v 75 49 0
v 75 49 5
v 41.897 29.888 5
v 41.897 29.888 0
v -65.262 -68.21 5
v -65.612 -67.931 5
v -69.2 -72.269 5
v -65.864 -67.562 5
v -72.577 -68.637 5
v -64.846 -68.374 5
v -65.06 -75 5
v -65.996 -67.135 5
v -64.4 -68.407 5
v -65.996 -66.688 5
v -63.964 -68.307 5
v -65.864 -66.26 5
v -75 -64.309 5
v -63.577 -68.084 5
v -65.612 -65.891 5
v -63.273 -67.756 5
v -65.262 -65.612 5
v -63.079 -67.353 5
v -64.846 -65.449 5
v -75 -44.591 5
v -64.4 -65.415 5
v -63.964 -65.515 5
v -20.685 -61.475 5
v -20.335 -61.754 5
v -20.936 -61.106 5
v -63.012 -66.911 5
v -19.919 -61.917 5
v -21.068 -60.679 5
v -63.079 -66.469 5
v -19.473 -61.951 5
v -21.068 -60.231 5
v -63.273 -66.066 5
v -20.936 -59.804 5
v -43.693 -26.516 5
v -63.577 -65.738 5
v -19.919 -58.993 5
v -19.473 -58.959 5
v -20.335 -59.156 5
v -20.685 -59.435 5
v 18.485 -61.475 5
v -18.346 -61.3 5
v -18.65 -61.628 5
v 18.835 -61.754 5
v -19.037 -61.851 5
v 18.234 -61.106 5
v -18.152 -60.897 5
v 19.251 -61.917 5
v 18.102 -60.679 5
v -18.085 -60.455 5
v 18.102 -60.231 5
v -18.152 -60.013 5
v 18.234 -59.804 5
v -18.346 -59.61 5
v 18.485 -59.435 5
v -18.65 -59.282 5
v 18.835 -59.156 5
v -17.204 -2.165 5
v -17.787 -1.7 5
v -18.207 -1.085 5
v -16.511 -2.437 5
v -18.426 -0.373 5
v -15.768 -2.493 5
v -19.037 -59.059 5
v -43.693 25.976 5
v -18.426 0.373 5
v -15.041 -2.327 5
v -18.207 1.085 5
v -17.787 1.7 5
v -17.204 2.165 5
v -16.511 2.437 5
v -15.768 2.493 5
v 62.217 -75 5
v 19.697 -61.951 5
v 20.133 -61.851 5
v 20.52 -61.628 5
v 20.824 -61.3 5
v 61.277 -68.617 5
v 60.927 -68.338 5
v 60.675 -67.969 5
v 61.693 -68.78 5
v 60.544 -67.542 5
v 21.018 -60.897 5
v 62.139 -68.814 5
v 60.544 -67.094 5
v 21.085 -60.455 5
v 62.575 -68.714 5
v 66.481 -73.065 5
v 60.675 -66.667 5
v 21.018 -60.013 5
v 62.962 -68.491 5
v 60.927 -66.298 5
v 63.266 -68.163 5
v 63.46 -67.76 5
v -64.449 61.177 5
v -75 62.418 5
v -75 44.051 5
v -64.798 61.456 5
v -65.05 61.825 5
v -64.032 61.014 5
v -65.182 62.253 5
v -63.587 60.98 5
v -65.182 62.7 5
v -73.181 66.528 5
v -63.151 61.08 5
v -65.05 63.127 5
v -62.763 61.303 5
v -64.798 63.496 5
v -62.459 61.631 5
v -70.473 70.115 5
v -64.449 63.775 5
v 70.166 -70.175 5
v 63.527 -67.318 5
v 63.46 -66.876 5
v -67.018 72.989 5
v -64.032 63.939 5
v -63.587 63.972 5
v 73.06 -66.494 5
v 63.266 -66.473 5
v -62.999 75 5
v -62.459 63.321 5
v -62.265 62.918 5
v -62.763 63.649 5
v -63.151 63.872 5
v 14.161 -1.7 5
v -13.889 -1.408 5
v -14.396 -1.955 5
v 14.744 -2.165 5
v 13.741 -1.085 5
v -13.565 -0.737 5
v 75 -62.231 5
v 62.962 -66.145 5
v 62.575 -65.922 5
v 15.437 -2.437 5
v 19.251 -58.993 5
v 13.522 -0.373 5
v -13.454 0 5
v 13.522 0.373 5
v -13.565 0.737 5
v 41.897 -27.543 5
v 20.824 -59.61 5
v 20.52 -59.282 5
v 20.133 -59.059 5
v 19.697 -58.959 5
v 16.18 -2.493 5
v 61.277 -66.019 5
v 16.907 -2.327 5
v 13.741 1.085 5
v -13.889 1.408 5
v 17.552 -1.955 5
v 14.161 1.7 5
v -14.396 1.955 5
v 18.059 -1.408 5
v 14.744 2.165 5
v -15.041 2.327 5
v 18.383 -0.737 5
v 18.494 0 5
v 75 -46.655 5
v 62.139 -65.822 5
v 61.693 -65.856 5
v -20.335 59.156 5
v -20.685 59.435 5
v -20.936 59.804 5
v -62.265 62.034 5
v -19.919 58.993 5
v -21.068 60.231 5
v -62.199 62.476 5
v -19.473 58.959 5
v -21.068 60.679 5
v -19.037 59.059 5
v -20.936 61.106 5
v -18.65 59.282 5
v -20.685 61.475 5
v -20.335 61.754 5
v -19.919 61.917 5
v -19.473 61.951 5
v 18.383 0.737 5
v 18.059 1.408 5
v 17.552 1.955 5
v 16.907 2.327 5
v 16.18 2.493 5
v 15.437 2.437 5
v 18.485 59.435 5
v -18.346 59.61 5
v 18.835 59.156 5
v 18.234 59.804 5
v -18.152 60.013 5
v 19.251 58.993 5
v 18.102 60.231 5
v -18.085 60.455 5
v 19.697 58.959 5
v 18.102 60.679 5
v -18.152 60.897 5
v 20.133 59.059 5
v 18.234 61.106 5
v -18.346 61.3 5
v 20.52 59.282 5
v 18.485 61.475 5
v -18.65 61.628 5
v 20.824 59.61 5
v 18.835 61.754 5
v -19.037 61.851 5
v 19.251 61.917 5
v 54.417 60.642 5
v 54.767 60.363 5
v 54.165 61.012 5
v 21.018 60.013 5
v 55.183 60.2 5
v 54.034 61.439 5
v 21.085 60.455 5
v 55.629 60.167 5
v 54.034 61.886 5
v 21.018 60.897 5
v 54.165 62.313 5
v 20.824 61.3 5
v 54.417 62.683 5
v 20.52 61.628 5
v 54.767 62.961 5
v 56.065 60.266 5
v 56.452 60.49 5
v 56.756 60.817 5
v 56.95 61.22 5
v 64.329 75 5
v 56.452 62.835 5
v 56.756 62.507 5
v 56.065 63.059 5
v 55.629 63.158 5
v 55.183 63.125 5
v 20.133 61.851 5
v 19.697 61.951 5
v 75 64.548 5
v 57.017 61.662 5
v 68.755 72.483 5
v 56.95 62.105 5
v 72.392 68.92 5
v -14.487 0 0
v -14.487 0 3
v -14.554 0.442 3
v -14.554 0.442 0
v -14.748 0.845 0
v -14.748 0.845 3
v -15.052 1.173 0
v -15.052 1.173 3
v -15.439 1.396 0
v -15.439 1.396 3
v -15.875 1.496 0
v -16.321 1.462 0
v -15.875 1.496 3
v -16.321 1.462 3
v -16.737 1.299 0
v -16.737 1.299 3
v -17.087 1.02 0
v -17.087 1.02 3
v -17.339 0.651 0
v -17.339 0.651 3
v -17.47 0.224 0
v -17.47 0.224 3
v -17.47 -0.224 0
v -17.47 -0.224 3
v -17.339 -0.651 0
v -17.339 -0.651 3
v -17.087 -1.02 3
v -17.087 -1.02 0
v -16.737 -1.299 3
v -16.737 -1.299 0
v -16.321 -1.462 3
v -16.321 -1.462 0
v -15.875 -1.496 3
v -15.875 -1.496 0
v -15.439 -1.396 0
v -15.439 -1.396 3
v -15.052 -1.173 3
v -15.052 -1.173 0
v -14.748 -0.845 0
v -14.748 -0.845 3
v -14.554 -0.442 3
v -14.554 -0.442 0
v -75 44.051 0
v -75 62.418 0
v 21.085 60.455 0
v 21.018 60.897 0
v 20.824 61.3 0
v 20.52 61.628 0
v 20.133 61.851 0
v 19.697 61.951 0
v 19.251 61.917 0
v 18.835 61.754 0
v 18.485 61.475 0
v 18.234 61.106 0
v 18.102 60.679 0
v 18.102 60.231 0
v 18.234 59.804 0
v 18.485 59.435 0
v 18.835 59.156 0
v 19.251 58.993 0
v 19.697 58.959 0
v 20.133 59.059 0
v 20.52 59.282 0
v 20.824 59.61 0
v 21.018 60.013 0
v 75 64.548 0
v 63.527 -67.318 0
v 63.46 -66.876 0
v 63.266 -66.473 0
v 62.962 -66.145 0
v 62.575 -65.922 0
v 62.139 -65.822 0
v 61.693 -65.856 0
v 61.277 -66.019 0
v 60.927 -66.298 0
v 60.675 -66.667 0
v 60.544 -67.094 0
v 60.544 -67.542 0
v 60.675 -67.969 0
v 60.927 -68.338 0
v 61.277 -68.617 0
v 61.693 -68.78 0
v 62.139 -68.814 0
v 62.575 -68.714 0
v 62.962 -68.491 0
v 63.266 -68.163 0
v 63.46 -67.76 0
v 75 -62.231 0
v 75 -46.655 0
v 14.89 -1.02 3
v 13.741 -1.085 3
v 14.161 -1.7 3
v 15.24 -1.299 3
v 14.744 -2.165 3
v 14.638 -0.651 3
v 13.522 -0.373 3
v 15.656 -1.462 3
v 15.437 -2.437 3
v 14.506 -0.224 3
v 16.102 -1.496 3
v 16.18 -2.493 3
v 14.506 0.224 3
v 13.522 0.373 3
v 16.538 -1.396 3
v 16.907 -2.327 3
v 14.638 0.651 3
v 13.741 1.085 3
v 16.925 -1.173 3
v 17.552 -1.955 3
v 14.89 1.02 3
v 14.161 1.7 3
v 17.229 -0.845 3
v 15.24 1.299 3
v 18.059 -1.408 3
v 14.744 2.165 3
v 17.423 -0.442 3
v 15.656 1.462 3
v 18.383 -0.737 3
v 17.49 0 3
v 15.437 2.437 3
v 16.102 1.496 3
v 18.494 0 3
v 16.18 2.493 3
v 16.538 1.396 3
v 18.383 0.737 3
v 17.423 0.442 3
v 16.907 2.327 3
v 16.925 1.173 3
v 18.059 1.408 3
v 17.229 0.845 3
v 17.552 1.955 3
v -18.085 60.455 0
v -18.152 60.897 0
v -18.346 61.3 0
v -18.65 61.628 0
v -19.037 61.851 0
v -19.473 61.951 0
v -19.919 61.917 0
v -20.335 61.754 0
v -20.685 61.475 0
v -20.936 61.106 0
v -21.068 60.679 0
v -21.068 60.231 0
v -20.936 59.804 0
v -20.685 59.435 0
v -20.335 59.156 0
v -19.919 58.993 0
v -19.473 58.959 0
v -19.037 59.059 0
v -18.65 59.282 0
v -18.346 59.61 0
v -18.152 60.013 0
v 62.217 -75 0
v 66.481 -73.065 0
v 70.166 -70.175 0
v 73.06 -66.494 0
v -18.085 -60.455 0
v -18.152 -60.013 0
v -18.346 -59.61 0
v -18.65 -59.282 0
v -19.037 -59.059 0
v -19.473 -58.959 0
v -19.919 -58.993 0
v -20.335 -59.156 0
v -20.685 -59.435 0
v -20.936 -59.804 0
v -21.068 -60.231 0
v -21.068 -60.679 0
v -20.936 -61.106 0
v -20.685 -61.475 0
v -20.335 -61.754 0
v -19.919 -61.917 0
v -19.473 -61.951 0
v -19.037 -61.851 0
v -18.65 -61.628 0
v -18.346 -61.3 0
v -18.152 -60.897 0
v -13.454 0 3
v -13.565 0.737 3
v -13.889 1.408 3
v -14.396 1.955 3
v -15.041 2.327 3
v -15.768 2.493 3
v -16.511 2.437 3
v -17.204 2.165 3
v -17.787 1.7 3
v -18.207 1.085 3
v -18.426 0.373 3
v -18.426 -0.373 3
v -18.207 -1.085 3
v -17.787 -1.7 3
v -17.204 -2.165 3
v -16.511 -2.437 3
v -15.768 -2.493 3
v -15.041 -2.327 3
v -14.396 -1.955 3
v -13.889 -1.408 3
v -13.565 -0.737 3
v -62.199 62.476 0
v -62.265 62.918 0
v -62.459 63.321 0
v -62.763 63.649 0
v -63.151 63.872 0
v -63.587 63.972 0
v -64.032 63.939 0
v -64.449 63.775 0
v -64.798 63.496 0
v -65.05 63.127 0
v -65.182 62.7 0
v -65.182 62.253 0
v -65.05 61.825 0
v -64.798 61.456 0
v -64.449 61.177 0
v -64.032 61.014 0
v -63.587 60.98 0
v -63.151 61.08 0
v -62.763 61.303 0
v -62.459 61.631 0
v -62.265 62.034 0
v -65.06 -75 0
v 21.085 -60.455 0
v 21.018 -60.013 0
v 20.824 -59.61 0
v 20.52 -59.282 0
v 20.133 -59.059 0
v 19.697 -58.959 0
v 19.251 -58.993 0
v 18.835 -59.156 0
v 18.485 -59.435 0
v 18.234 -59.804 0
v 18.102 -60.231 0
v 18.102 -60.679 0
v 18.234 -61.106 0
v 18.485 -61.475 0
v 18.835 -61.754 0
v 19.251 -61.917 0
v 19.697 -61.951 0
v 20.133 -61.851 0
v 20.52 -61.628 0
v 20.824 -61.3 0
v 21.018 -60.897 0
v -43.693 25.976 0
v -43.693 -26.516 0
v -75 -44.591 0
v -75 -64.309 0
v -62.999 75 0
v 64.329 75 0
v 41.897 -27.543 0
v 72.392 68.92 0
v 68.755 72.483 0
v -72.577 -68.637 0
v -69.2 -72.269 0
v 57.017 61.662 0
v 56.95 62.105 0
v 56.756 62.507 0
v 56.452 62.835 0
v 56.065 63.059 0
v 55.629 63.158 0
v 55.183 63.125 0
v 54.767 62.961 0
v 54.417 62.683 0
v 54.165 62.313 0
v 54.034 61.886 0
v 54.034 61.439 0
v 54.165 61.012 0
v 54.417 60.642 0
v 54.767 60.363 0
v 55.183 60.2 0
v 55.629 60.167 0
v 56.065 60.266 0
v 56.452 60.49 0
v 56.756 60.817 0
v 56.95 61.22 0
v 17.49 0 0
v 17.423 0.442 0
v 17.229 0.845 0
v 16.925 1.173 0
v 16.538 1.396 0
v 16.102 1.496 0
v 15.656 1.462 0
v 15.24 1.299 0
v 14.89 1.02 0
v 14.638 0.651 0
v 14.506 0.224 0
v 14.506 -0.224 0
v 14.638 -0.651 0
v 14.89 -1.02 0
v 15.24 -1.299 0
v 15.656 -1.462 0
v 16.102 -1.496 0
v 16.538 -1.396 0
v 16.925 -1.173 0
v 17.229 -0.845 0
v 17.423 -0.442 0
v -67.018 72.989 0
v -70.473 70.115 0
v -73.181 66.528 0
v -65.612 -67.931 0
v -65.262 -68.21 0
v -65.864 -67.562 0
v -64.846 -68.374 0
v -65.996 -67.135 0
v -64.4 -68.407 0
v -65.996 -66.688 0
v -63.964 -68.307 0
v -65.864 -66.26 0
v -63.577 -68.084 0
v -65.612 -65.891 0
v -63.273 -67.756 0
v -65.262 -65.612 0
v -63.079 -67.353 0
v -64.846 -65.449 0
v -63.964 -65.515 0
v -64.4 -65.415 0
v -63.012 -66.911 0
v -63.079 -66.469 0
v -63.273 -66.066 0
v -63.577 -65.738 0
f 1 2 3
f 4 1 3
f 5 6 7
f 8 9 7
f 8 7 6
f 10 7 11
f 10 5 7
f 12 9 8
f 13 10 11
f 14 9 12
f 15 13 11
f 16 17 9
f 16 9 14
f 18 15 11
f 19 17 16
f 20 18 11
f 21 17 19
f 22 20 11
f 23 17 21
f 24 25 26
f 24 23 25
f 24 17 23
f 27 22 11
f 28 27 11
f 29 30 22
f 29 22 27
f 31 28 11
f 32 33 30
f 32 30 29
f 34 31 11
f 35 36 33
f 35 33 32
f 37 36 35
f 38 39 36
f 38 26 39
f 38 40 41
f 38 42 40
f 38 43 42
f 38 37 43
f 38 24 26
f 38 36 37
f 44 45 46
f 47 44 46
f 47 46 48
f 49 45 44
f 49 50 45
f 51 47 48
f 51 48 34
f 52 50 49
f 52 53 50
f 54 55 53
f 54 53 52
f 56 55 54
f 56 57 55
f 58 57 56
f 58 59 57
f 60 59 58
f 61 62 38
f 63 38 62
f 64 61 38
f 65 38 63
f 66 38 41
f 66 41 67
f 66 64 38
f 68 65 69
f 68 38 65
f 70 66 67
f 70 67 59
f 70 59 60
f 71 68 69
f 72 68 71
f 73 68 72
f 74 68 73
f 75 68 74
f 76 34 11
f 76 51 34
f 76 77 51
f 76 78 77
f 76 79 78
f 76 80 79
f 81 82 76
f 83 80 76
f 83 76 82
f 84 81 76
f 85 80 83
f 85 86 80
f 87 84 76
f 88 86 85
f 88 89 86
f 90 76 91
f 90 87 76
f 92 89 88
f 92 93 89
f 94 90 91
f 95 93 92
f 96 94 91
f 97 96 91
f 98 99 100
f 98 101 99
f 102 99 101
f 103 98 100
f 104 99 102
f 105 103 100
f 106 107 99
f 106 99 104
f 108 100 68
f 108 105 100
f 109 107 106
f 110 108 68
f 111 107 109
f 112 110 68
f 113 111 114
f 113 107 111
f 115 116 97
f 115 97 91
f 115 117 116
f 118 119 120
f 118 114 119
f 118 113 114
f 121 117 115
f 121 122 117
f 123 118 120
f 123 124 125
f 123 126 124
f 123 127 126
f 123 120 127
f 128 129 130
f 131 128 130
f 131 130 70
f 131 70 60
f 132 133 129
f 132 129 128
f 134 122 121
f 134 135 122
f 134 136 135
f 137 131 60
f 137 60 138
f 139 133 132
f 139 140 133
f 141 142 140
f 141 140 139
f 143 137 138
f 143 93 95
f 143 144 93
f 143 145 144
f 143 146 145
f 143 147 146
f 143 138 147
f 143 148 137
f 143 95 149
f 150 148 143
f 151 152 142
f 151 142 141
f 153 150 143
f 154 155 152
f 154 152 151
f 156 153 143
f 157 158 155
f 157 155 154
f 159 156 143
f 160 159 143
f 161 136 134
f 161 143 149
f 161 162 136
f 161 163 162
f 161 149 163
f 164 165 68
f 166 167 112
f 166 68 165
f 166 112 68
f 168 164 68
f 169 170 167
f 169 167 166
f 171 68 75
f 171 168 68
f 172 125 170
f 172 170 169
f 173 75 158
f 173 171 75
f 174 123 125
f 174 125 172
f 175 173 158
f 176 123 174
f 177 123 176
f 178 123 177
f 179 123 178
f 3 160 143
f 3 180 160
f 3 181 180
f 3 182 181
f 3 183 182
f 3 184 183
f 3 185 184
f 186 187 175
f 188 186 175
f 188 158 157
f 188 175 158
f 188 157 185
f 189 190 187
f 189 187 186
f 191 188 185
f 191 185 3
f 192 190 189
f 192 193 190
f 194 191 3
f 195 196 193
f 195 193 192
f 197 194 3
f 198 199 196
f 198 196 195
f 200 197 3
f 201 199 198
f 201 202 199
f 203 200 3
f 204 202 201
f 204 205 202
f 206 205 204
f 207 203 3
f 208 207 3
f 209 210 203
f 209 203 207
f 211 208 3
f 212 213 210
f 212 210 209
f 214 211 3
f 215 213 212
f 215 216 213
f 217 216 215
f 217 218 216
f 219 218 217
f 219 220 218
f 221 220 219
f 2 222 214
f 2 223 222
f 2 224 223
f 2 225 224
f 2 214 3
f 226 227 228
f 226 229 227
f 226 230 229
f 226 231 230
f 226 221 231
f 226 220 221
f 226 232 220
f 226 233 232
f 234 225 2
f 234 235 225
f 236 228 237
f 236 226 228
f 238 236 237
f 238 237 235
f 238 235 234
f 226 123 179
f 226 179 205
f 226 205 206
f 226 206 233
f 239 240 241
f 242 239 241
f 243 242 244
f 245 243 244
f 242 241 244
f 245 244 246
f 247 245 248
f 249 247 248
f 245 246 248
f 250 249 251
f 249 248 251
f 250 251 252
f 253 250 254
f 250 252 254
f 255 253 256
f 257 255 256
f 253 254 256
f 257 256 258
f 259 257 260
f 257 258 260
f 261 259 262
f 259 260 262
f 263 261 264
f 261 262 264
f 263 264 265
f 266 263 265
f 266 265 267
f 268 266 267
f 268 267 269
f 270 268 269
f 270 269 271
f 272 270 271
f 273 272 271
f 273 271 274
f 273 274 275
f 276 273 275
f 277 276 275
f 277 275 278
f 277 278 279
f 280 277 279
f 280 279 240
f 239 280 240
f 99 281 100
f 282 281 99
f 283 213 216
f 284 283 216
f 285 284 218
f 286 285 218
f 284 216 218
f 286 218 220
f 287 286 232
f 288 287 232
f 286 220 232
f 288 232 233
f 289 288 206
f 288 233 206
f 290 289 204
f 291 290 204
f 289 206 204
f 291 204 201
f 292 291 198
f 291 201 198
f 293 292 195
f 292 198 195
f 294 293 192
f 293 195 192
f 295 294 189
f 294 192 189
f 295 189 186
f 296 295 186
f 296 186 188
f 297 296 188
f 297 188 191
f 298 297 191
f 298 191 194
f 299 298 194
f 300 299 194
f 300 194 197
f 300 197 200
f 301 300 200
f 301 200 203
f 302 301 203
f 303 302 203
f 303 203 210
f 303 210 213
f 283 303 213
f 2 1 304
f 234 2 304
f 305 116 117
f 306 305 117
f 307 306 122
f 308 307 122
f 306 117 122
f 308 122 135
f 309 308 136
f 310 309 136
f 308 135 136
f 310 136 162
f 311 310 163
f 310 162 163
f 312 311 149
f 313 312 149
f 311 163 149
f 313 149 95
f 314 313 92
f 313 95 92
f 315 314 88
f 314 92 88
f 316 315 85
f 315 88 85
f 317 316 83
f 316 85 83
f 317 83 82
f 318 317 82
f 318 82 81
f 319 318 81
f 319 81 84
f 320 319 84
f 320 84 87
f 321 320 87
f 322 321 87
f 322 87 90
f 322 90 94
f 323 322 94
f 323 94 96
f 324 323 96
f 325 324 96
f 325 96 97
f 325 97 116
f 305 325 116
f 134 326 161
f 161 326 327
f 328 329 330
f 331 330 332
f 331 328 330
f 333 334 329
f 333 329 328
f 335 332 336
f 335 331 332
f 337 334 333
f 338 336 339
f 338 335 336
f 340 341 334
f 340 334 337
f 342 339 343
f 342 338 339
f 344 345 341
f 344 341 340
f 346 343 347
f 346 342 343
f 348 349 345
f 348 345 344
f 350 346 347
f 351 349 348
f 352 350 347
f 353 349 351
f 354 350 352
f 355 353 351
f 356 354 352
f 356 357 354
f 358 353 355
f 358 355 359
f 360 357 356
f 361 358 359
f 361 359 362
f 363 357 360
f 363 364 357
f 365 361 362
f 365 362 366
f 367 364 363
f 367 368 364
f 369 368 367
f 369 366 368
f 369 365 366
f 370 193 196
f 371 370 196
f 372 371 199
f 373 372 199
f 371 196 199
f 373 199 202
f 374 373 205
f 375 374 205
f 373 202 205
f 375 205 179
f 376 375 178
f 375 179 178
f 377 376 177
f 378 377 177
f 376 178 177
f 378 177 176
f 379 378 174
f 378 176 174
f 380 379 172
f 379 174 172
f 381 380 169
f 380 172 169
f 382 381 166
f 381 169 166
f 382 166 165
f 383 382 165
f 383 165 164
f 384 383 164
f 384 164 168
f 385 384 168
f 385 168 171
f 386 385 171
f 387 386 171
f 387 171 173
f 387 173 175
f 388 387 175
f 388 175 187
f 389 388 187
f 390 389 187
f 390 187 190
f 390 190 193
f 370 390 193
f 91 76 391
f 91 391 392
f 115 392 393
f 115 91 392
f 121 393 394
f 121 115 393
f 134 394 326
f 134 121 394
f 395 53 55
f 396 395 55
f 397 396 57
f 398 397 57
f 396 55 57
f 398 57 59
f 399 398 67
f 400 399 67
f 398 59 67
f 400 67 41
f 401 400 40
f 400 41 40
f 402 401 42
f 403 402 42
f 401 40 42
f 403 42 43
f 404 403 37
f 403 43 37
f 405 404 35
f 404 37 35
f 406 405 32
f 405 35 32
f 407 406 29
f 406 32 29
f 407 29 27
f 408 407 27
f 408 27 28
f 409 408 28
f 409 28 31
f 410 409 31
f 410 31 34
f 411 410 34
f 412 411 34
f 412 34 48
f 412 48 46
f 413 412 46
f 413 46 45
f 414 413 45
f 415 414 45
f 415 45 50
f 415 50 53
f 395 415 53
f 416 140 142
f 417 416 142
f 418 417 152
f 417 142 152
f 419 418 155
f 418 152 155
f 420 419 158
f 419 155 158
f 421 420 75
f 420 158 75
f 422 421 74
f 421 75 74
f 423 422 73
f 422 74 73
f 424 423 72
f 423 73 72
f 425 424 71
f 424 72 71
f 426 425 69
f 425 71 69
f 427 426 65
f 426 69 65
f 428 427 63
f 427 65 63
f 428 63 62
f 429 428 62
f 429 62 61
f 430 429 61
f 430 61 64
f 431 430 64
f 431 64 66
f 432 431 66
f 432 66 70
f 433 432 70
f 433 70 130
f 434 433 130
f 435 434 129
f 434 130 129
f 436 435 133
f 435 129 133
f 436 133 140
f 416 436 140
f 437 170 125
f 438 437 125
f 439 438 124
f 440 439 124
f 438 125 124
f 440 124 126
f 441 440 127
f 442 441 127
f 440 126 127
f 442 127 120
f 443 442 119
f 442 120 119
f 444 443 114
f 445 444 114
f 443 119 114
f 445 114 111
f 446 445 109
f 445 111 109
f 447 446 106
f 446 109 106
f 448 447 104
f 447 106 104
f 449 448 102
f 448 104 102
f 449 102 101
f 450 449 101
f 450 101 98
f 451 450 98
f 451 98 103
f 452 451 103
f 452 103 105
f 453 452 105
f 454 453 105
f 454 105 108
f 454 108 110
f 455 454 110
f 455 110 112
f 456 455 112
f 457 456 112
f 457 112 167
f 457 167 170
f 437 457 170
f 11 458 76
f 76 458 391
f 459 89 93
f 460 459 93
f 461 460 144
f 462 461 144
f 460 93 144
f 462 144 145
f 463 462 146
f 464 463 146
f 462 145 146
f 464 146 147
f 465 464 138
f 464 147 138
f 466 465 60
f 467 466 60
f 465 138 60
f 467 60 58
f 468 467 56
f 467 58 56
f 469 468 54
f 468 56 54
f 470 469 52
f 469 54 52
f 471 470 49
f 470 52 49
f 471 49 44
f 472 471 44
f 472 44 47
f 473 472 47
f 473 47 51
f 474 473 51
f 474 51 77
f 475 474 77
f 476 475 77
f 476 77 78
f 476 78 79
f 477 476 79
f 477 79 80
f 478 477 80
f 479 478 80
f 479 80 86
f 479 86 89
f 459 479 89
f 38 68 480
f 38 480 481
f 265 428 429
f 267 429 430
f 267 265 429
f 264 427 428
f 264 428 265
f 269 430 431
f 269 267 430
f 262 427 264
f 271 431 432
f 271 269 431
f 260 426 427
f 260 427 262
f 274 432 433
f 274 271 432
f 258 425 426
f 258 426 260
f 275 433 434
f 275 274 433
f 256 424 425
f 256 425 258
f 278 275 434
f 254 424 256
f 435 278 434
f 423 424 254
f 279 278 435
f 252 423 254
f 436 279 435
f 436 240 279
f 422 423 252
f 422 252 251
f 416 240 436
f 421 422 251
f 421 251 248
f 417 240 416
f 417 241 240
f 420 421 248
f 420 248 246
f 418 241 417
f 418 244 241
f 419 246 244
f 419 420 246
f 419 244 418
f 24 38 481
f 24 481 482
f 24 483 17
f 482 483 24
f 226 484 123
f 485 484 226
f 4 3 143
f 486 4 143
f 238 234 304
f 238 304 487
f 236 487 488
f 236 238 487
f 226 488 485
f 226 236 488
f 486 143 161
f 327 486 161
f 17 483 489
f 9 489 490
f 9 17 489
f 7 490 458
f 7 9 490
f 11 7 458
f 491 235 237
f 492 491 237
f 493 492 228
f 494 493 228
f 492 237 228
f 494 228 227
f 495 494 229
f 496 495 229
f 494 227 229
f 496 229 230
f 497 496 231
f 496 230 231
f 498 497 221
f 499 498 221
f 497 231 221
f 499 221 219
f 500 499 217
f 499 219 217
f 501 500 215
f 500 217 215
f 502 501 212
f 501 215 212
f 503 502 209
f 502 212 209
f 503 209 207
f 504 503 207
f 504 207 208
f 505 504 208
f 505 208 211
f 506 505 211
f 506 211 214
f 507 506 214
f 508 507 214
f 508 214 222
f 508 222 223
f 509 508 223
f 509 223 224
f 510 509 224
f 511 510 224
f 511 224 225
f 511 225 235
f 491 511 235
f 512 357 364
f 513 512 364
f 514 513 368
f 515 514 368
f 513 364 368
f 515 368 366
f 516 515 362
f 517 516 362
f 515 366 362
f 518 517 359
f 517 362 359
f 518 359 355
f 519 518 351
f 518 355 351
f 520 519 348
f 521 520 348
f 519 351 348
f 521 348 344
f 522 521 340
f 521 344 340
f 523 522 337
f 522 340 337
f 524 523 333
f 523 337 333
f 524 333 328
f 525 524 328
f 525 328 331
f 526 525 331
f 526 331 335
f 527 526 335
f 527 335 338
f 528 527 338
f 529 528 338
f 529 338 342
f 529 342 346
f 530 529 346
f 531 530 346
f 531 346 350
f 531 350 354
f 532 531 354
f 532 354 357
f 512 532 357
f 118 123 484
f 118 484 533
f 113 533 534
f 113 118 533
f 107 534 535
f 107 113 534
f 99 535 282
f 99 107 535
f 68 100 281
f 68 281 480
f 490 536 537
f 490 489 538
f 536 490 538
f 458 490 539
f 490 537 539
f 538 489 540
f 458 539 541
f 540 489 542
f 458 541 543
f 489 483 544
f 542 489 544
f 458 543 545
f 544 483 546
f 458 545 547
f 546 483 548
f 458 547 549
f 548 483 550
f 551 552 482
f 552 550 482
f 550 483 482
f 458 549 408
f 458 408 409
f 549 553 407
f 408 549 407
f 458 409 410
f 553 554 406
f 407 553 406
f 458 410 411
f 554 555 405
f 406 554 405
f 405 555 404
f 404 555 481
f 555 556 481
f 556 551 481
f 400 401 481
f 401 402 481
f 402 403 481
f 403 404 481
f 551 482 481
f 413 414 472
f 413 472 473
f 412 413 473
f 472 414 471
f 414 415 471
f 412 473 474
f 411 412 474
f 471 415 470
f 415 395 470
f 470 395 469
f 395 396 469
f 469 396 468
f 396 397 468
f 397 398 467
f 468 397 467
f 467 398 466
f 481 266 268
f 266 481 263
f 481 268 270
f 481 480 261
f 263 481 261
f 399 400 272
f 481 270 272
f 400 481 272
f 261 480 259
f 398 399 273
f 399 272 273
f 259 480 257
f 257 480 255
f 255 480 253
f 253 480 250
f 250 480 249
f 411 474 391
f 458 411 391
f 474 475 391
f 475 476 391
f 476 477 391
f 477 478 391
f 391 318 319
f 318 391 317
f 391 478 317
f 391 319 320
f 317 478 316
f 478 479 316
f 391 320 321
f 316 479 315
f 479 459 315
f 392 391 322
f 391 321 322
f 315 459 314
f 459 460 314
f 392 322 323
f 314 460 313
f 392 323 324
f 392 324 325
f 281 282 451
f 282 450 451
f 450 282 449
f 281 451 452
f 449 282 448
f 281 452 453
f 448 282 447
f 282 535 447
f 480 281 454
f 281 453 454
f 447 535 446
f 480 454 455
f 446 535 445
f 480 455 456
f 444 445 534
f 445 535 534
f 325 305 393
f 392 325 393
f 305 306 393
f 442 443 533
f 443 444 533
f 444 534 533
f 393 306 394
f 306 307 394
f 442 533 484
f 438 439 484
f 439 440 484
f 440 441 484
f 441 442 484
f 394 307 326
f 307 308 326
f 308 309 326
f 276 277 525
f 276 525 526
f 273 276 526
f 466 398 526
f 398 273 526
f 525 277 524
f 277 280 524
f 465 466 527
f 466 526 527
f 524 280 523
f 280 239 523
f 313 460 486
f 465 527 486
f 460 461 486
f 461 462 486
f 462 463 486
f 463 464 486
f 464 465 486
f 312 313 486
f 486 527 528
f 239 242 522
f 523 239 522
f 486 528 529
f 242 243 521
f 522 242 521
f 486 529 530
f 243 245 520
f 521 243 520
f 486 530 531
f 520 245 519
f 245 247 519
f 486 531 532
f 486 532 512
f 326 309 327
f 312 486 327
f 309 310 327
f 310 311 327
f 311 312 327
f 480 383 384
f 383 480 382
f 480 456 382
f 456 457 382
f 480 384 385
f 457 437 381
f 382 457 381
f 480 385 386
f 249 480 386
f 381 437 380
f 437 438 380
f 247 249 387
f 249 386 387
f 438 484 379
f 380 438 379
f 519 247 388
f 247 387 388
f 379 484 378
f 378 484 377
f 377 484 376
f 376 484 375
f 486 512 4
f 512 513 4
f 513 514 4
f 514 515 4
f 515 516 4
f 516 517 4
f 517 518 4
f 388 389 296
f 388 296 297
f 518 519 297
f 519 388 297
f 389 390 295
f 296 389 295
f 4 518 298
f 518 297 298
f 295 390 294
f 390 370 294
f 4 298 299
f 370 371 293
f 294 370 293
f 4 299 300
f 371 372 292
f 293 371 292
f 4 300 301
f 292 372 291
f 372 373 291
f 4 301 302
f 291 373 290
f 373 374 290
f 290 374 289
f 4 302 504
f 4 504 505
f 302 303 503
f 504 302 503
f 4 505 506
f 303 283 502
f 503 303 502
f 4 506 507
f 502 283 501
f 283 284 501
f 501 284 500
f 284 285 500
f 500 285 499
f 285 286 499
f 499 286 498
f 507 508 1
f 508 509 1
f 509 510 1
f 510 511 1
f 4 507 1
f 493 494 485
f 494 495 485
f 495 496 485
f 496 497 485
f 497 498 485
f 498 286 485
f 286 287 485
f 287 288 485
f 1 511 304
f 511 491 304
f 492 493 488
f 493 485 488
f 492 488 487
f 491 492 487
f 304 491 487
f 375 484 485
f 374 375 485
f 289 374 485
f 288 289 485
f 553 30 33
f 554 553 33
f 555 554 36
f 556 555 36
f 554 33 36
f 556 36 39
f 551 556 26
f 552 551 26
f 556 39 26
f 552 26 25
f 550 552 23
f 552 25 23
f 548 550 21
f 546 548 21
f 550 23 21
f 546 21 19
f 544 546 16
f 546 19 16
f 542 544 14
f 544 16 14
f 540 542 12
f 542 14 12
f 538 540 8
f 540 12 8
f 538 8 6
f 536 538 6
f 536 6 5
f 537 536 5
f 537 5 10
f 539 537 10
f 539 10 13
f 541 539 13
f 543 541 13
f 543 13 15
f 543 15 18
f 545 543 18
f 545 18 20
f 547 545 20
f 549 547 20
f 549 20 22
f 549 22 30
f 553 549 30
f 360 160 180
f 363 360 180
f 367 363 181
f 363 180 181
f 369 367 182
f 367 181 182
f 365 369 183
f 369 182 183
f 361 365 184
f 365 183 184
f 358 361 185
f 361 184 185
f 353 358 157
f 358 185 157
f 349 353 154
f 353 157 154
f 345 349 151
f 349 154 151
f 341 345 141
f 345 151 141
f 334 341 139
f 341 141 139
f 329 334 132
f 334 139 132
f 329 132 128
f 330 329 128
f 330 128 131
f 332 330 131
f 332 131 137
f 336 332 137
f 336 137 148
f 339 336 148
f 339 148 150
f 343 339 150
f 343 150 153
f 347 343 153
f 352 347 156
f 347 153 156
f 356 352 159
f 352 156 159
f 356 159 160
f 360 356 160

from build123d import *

# Parameters (mm, degrees)
SKETCH_W        = 150
SKETCH_H        = 150
PAD_DEPTH       = 5
SKETCH001_R     = 1.5
POCKET_DEPTH    = 6
POCKET001_DEPTH = 6
SKETCH003_R     = 1.5
POCKET002_DEPTH = 6
SKETCH004_R     = 2.5
POCKET003_DEPTH = 2


with BuildPart() as part:
    # Sketch → Pad (new body)
    with BuildSketch(Plane.XY):
        Rectangle(SKETCH_W, SKETCH_H)
    extrude(amount=PAD_DEPTH)

    # Sketch001 (on Face6 of Pad) → Pocket (cut)
    with BuildSketch(Plane.XY.offset(5)):
        with Locations((-63.698635, 62.476162)):
            Circle(SKETCH001_R)
        with Locations((55.516754, 61.662395)):
            Circle(SKETCH001_R)
        with Locations((62.026806, -67.318062)):
            Circle(SKETCH001_R)
        with Locations((-64.51239, -66.911179)):
            Circle(SKETCH001_R)
        with Locations((-15.987179, 0)):
            Circle(SKETCH001_R)
        with Locations((15.989725, 0)):
            Circle(SKETCH001_R)
        Polygon((-78.334322, 45.976028), (-43.69331, 25.97602), (-43.69331, -26.515585), (-78.334322, -46.515593), align=None)
        Polygon((76.538069, 49.887789), (41.89705, 29.887793), (41.89705, -27.543442), (76.538069, -47.543438), align=None)
    extrude(amount=-POCKET_DEPTH, mode=Mode.SUBTRACT)

    # Sketch002 (on Face5 of Pocket) → Pocket001 (cut)
    with BuildSketch(Plane.XY.offset(5)):
        with BuildLine():
            ThreePointArc((-76.389725, -59.129343), (-71.755036, -69.691564), (-62.212372, -76.170639))
            Line((-62.212372, -76.170639), (-76.389725, -76.170639))
            Line((-76.389725, -59.129343), (-76.389725, -76.170639))
        make_face()
        with BuildLine():
            ThreePointArc((76.179779, 60.880058), (70.14646, 71.330769), (59.165479, 76.334403))
            Line((59.165479, 76.334403), (75.819939, 75.661225))
            Line((76.179779, 60.880058), (75.819939, 75.661225))
        make_face()
        with BuildLine():
            ThreePointArc((60.306034, -75.499916), (70.844496, -69.462138), (75.808842, -58.377499))
            Line((75.808842, -58.377499), (75.280468, -75.273705))
            Line((60.306034, -75.499916), (75.280468, -75.273705))
        make_face()
        with BuildLine():
            ThreePointArc((-57.073154, 76.163305), (-69.273576, 71.27005), (-75.626793, 59.762188))
            Line((-75.626793, 59.762188), (-75.289242, 75.58445))
            Line((-57.073154, 76.163305), (-75.289242, 75.58445))
        make_face()
    extrude(amount=-POCKET001_DEPTH, mode=Mode.SUBTRACT)

    # Sketch003 (on Face4 of Pocket001) → Pocket002 (cut)
    with BuildSketch(Plane.XY.offset(5)):
        with Locations((-19.585, 60.455048)):
            Circle(SKETCH003_R)
        with Locations((19.585, 60.455048)):
            Circle(SKETCH003_R)
        with Locations((19.585, -60.455048)):
            Circle(SKETCH003_R)
        with Locations((-19.585, -60.455048)):
            Circle(SKETCH003_R)
    extrude(amount=-POCKET002_DEPTH, mode=Mode.SUBTRACT)

    # Sketch004 (on Face4 of Pocket002) → Pocket003 (cut)
    with BuildSketch(Plane.XY.offset(5)):
        with Locations((-15.954409, 0)):
            Circle(SKETCH004_R)
        with Locations((15.993672, 0)):
            Circle(SKETCH004_R)
    extrude(amount=-POCKET003_DEPTH, mode=Mode.SUBTRACT)


solid = part.part
